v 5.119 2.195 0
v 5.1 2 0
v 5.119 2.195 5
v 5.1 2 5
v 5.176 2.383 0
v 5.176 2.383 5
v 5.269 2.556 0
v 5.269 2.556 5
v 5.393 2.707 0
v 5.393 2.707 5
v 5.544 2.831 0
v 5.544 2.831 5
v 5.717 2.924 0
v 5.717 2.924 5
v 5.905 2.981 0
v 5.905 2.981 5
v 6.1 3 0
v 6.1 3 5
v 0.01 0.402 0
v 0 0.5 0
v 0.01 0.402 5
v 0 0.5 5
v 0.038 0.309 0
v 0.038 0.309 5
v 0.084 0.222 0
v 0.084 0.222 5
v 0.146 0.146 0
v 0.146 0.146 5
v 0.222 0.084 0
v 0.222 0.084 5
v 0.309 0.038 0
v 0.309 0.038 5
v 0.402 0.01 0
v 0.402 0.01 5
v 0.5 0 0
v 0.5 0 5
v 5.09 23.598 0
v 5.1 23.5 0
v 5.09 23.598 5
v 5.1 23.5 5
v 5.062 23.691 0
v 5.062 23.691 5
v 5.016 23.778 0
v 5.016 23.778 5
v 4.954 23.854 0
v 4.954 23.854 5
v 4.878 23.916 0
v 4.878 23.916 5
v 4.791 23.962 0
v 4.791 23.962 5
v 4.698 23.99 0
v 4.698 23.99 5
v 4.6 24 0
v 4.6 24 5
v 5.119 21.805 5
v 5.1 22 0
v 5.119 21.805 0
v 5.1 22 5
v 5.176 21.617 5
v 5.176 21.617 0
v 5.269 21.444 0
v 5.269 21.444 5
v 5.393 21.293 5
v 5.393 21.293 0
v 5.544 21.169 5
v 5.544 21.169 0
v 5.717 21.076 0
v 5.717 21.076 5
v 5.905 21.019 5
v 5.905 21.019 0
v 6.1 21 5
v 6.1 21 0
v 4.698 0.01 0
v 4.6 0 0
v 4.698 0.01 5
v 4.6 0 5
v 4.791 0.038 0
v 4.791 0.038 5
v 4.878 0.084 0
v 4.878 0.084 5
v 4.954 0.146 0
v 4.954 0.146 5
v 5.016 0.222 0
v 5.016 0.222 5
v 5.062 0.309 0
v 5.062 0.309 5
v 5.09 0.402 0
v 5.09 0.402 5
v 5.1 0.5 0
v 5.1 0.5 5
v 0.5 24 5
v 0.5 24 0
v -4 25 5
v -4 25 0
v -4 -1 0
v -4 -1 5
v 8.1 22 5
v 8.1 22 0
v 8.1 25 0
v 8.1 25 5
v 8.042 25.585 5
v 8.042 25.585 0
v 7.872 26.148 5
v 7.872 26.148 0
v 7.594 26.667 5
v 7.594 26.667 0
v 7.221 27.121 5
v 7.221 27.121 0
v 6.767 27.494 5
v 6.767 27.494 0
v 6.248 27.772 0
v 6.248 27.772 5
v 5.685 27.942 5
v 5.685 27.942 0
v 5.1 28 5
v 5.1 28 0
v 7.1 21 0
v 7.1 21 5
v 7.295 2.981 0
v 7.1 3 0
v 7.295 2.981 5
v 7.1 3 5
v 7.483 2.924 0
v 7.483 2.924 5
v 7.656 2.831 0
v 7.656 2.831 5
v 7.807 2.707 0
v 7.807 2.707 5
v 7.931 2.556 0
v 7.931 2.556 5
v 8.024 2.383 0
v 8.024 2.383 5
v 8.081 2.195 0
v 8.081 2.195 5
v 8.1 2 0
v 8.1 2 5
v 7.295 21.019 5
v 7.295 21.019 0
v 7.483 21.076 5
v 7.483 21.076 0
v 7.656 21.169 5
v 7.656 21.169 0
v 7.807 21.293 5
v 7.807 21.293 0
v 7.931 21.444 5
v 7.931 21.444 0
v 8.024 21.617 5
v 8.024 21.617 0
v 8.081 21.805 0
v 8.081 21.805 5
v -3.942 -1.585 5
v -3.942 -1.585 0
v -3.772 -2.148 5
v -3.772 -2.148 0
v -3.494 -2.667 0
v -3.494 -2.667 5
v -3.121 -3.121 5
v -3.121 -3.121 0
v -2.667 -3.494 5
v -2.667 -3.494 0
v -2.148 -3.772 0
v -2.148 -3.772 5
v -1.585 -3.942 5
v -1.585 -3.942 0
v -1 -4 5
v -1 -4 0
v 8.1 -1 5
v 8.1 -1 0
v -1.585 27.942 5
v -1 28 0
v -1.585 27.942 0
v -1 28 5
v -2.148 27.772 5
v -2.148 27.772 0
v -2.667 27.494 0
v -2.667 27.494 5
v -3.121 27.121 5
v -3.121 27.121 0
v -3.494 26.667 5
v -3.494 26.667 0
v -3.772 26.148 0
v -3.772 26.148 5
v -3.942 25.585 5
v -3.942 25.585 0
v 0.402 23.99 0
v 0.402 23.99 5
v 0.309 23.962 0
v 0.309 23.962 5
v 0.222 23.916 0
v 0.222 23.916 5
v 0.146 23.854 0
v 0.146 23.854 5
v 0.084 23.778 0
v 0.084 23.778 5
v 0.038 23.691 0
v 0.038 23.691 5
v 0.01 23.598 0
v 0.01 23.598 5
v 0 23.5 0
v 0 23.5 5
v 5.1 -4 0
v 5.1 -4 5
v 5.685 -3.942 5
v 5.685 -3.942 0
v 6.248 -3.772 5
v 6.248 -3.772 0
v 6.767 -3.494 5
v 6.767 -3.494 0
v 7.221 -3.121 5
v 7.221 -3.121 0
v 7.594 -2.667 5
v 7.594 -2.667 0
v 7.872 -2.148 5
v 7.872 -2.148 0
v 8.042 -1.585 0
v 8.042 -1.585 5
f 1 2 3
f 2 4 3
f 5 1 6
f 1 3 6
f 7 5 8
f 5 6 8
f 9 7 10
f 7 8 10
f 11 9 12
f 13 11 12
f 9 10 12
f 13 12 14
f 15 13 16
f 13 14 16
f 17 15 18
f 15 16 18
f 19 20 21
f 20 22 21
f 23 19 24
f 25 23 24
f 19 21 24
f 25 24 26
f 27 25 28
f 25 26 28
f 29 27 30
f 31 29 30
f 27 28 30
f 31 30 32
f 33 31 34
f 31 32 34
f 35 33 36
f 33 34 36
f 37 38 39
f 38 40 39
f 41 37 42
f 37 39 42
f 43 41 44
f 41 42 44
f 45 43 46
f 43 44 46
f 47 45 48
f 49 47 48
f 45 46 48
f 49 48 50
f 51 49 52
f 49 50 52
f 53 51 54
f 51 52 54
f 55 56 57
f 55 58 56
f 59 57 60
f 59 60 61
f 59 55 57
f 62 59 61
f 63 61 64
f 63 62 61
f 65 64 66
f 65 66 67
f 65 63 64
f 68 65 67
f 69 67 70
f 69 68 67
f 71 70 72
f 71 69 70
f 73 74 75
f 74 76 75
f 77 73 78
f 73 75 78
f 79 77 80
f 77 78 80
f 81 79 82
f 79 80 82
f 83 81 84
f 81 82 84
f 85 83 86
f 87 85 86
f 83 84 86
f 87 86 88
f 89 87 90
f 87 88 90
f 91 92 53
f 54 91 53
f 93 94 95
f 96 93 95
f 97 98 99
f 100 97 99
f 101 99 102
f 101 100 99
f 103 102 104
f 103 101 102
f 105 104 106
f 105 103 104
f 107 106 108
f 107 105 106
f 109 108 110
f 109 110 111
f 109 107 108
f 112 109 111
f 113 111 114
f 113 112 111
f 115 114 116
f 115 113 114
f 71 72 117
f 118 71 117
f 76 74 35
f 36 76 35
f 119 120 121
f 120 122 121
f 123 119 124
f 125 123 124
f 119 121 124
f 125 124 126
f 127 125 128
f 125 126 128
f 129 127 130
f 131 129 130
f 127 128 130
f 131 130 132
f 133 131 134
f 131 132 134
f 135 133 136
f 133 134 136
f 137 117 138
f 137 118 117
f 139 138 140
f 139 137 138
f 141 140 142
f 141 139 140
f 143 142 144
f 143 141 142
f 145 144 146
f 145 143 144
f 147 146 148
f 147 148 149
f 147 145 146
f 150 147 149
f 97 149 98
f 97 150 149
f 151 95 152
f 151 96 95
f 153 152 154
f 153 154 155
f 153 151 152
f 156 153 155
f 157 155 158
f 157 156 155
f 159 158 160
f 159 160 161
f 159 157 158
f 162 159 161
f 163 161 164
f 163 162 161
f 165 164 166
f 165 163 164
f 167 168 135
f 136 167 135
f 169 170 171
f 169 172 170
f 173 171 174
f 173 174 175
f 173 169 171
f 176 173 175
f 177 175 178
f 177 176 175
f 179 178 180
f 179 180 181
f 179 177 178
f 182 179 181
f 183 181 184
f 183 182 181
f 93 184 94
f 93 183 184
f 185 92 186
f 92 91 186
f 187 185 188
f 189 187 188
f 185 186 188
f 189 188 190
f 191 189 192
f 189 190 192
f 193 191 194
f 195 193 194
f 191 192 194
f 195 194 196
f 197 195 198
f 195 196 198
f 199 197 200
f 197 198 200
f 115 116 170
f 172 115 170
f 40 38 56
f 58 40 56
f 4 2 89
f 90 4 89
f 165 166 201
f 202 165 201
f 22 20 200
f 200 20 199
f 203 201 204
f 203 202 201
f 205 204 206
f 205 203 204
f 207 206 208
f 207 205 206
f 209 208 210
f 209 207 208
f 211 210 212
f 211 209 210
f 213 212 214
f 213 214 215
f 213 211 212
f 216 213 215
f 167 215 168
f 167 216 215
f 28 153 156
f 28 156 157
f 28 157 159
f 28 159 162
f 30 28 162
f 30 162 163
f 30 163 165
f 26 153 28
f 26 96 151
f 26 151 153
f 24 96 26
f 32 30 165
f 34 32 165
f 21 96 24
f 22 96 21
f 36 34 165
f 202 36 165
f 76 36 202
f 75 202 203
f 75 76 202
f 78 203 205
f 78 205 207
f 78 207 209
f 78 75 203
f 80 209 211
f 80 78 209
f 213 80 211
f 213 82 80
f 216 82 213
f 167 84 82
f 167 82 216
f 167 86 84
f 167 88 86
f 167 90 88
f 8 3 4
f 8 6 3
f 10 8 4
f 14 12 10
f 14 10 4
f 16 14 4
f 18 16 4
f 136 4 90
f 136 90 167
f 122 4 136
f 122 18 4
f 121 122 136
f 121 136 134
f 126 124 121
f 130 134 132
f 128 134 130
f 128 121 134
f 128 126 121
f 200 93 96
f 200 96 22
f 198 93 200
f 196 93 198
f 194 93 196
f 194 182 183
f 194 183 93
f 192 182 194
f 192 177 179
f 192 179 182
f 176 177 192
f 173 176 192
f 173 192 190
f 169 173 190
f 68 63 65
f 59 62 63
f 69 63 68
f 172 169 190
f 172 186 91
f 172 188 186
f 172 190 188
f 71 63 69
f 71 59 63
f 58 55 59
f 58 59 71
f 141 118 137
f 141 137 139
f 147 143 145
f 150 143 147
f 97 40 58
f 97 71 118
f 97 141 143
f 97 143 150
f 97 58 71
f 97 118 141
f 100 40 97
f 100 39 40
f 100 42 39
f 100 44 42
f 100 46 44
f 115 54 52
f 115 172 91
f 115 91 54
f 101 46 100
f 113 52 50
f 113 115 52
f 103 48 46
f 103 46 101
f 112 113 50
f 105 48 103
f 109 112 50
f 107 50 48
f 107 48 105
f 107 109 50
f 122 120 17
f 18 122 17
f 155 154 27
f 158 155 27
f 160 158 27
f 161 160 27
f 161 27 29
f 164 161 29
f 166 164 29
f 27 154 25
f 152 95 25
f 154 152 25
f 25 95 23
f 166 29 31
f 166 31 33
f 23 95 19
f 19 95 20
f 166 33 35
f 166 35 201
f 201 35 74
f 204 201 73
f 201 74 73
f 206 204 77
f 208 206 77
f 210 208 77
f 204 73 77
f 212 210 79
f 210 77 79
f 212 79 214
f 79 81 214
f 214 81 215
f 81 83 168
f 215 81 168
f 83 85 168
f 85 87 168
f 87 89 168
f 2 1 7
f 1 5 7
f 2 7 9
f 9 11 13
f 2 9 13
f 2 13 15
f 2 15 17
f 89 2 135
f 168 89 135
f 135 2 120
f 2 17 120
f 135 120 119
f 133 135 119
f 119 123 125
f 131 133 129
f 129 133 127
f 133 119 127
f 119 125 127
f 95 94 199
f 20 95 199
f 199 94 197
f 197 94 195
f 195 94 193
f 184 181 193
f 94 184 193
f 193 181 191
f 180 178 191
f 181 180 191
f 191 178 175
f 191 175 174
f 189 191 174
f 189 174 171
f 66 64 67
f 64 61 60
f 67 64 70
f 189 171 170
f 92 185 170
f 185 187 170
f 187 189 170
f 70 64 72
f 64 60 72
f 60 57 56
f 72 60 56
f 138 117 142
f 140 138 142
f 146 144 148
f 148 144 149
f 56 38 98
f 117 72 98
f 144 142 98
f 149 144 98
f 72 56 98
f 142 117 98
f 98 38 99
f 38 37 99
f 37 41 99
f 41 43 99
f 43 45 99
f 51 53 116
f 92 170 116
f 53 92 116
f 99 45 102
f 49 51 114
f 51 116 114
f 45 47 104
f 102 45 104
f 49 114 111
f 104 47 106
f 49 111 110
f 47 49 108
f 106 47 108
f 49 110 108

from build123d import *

# Parameters (mm, degrees)
F1_DEPTH = 5
F2_R     = 3
F3_R     = 0.5
F4_R     = 1


with BuildPart() as f1:
    # F0 (on Top) → F1 (new body)
    with BuildSketch(Plane.XY):
        Polygon((5.1, 0), (0, 0), (0, 24), (5.1, 24), (5.1, 21), (8.1, 21), (8.1, 28), (-4, 28), (-4, -4), (8.1, -4), (8.1, 3), (5.1, 3), align=None)
    extrude(amount=F1_DEPTH)

    # F2
    f2_edges = [f1.edges().sort_by_distance(p)[0] for p in [
        (-4, 28, 2.5),
        (-4, -4, 2.5),
        (8.1, -4, 2.5),
        (8.1, 28, 2.5),
    ]]
    fillet(f2_edges, radius=F2_R)

    # F3
    f3_edges = [f1.edges().sort_by_distance(p)[0] for p in [
        (0, 24, 2.5),
        (5.1, 24, 2.5),
        (0, 0, 2.5),
        (5.1, 0, 2.5),
    ]]
    fillet(f3_edges, radius=F3_R)

    # F4
    f4_edges = [f1.edges().sort_by_distance(p)[0] for p in [
        (5.1, 21, 2.5),
        (5.1, 3, 2.5),
        (8.1, 21, 2.5),
        (8.1, 3, 2.5),
    ]]
    fillet(f4_edges, radius=F4_R)


solid = f1.part
